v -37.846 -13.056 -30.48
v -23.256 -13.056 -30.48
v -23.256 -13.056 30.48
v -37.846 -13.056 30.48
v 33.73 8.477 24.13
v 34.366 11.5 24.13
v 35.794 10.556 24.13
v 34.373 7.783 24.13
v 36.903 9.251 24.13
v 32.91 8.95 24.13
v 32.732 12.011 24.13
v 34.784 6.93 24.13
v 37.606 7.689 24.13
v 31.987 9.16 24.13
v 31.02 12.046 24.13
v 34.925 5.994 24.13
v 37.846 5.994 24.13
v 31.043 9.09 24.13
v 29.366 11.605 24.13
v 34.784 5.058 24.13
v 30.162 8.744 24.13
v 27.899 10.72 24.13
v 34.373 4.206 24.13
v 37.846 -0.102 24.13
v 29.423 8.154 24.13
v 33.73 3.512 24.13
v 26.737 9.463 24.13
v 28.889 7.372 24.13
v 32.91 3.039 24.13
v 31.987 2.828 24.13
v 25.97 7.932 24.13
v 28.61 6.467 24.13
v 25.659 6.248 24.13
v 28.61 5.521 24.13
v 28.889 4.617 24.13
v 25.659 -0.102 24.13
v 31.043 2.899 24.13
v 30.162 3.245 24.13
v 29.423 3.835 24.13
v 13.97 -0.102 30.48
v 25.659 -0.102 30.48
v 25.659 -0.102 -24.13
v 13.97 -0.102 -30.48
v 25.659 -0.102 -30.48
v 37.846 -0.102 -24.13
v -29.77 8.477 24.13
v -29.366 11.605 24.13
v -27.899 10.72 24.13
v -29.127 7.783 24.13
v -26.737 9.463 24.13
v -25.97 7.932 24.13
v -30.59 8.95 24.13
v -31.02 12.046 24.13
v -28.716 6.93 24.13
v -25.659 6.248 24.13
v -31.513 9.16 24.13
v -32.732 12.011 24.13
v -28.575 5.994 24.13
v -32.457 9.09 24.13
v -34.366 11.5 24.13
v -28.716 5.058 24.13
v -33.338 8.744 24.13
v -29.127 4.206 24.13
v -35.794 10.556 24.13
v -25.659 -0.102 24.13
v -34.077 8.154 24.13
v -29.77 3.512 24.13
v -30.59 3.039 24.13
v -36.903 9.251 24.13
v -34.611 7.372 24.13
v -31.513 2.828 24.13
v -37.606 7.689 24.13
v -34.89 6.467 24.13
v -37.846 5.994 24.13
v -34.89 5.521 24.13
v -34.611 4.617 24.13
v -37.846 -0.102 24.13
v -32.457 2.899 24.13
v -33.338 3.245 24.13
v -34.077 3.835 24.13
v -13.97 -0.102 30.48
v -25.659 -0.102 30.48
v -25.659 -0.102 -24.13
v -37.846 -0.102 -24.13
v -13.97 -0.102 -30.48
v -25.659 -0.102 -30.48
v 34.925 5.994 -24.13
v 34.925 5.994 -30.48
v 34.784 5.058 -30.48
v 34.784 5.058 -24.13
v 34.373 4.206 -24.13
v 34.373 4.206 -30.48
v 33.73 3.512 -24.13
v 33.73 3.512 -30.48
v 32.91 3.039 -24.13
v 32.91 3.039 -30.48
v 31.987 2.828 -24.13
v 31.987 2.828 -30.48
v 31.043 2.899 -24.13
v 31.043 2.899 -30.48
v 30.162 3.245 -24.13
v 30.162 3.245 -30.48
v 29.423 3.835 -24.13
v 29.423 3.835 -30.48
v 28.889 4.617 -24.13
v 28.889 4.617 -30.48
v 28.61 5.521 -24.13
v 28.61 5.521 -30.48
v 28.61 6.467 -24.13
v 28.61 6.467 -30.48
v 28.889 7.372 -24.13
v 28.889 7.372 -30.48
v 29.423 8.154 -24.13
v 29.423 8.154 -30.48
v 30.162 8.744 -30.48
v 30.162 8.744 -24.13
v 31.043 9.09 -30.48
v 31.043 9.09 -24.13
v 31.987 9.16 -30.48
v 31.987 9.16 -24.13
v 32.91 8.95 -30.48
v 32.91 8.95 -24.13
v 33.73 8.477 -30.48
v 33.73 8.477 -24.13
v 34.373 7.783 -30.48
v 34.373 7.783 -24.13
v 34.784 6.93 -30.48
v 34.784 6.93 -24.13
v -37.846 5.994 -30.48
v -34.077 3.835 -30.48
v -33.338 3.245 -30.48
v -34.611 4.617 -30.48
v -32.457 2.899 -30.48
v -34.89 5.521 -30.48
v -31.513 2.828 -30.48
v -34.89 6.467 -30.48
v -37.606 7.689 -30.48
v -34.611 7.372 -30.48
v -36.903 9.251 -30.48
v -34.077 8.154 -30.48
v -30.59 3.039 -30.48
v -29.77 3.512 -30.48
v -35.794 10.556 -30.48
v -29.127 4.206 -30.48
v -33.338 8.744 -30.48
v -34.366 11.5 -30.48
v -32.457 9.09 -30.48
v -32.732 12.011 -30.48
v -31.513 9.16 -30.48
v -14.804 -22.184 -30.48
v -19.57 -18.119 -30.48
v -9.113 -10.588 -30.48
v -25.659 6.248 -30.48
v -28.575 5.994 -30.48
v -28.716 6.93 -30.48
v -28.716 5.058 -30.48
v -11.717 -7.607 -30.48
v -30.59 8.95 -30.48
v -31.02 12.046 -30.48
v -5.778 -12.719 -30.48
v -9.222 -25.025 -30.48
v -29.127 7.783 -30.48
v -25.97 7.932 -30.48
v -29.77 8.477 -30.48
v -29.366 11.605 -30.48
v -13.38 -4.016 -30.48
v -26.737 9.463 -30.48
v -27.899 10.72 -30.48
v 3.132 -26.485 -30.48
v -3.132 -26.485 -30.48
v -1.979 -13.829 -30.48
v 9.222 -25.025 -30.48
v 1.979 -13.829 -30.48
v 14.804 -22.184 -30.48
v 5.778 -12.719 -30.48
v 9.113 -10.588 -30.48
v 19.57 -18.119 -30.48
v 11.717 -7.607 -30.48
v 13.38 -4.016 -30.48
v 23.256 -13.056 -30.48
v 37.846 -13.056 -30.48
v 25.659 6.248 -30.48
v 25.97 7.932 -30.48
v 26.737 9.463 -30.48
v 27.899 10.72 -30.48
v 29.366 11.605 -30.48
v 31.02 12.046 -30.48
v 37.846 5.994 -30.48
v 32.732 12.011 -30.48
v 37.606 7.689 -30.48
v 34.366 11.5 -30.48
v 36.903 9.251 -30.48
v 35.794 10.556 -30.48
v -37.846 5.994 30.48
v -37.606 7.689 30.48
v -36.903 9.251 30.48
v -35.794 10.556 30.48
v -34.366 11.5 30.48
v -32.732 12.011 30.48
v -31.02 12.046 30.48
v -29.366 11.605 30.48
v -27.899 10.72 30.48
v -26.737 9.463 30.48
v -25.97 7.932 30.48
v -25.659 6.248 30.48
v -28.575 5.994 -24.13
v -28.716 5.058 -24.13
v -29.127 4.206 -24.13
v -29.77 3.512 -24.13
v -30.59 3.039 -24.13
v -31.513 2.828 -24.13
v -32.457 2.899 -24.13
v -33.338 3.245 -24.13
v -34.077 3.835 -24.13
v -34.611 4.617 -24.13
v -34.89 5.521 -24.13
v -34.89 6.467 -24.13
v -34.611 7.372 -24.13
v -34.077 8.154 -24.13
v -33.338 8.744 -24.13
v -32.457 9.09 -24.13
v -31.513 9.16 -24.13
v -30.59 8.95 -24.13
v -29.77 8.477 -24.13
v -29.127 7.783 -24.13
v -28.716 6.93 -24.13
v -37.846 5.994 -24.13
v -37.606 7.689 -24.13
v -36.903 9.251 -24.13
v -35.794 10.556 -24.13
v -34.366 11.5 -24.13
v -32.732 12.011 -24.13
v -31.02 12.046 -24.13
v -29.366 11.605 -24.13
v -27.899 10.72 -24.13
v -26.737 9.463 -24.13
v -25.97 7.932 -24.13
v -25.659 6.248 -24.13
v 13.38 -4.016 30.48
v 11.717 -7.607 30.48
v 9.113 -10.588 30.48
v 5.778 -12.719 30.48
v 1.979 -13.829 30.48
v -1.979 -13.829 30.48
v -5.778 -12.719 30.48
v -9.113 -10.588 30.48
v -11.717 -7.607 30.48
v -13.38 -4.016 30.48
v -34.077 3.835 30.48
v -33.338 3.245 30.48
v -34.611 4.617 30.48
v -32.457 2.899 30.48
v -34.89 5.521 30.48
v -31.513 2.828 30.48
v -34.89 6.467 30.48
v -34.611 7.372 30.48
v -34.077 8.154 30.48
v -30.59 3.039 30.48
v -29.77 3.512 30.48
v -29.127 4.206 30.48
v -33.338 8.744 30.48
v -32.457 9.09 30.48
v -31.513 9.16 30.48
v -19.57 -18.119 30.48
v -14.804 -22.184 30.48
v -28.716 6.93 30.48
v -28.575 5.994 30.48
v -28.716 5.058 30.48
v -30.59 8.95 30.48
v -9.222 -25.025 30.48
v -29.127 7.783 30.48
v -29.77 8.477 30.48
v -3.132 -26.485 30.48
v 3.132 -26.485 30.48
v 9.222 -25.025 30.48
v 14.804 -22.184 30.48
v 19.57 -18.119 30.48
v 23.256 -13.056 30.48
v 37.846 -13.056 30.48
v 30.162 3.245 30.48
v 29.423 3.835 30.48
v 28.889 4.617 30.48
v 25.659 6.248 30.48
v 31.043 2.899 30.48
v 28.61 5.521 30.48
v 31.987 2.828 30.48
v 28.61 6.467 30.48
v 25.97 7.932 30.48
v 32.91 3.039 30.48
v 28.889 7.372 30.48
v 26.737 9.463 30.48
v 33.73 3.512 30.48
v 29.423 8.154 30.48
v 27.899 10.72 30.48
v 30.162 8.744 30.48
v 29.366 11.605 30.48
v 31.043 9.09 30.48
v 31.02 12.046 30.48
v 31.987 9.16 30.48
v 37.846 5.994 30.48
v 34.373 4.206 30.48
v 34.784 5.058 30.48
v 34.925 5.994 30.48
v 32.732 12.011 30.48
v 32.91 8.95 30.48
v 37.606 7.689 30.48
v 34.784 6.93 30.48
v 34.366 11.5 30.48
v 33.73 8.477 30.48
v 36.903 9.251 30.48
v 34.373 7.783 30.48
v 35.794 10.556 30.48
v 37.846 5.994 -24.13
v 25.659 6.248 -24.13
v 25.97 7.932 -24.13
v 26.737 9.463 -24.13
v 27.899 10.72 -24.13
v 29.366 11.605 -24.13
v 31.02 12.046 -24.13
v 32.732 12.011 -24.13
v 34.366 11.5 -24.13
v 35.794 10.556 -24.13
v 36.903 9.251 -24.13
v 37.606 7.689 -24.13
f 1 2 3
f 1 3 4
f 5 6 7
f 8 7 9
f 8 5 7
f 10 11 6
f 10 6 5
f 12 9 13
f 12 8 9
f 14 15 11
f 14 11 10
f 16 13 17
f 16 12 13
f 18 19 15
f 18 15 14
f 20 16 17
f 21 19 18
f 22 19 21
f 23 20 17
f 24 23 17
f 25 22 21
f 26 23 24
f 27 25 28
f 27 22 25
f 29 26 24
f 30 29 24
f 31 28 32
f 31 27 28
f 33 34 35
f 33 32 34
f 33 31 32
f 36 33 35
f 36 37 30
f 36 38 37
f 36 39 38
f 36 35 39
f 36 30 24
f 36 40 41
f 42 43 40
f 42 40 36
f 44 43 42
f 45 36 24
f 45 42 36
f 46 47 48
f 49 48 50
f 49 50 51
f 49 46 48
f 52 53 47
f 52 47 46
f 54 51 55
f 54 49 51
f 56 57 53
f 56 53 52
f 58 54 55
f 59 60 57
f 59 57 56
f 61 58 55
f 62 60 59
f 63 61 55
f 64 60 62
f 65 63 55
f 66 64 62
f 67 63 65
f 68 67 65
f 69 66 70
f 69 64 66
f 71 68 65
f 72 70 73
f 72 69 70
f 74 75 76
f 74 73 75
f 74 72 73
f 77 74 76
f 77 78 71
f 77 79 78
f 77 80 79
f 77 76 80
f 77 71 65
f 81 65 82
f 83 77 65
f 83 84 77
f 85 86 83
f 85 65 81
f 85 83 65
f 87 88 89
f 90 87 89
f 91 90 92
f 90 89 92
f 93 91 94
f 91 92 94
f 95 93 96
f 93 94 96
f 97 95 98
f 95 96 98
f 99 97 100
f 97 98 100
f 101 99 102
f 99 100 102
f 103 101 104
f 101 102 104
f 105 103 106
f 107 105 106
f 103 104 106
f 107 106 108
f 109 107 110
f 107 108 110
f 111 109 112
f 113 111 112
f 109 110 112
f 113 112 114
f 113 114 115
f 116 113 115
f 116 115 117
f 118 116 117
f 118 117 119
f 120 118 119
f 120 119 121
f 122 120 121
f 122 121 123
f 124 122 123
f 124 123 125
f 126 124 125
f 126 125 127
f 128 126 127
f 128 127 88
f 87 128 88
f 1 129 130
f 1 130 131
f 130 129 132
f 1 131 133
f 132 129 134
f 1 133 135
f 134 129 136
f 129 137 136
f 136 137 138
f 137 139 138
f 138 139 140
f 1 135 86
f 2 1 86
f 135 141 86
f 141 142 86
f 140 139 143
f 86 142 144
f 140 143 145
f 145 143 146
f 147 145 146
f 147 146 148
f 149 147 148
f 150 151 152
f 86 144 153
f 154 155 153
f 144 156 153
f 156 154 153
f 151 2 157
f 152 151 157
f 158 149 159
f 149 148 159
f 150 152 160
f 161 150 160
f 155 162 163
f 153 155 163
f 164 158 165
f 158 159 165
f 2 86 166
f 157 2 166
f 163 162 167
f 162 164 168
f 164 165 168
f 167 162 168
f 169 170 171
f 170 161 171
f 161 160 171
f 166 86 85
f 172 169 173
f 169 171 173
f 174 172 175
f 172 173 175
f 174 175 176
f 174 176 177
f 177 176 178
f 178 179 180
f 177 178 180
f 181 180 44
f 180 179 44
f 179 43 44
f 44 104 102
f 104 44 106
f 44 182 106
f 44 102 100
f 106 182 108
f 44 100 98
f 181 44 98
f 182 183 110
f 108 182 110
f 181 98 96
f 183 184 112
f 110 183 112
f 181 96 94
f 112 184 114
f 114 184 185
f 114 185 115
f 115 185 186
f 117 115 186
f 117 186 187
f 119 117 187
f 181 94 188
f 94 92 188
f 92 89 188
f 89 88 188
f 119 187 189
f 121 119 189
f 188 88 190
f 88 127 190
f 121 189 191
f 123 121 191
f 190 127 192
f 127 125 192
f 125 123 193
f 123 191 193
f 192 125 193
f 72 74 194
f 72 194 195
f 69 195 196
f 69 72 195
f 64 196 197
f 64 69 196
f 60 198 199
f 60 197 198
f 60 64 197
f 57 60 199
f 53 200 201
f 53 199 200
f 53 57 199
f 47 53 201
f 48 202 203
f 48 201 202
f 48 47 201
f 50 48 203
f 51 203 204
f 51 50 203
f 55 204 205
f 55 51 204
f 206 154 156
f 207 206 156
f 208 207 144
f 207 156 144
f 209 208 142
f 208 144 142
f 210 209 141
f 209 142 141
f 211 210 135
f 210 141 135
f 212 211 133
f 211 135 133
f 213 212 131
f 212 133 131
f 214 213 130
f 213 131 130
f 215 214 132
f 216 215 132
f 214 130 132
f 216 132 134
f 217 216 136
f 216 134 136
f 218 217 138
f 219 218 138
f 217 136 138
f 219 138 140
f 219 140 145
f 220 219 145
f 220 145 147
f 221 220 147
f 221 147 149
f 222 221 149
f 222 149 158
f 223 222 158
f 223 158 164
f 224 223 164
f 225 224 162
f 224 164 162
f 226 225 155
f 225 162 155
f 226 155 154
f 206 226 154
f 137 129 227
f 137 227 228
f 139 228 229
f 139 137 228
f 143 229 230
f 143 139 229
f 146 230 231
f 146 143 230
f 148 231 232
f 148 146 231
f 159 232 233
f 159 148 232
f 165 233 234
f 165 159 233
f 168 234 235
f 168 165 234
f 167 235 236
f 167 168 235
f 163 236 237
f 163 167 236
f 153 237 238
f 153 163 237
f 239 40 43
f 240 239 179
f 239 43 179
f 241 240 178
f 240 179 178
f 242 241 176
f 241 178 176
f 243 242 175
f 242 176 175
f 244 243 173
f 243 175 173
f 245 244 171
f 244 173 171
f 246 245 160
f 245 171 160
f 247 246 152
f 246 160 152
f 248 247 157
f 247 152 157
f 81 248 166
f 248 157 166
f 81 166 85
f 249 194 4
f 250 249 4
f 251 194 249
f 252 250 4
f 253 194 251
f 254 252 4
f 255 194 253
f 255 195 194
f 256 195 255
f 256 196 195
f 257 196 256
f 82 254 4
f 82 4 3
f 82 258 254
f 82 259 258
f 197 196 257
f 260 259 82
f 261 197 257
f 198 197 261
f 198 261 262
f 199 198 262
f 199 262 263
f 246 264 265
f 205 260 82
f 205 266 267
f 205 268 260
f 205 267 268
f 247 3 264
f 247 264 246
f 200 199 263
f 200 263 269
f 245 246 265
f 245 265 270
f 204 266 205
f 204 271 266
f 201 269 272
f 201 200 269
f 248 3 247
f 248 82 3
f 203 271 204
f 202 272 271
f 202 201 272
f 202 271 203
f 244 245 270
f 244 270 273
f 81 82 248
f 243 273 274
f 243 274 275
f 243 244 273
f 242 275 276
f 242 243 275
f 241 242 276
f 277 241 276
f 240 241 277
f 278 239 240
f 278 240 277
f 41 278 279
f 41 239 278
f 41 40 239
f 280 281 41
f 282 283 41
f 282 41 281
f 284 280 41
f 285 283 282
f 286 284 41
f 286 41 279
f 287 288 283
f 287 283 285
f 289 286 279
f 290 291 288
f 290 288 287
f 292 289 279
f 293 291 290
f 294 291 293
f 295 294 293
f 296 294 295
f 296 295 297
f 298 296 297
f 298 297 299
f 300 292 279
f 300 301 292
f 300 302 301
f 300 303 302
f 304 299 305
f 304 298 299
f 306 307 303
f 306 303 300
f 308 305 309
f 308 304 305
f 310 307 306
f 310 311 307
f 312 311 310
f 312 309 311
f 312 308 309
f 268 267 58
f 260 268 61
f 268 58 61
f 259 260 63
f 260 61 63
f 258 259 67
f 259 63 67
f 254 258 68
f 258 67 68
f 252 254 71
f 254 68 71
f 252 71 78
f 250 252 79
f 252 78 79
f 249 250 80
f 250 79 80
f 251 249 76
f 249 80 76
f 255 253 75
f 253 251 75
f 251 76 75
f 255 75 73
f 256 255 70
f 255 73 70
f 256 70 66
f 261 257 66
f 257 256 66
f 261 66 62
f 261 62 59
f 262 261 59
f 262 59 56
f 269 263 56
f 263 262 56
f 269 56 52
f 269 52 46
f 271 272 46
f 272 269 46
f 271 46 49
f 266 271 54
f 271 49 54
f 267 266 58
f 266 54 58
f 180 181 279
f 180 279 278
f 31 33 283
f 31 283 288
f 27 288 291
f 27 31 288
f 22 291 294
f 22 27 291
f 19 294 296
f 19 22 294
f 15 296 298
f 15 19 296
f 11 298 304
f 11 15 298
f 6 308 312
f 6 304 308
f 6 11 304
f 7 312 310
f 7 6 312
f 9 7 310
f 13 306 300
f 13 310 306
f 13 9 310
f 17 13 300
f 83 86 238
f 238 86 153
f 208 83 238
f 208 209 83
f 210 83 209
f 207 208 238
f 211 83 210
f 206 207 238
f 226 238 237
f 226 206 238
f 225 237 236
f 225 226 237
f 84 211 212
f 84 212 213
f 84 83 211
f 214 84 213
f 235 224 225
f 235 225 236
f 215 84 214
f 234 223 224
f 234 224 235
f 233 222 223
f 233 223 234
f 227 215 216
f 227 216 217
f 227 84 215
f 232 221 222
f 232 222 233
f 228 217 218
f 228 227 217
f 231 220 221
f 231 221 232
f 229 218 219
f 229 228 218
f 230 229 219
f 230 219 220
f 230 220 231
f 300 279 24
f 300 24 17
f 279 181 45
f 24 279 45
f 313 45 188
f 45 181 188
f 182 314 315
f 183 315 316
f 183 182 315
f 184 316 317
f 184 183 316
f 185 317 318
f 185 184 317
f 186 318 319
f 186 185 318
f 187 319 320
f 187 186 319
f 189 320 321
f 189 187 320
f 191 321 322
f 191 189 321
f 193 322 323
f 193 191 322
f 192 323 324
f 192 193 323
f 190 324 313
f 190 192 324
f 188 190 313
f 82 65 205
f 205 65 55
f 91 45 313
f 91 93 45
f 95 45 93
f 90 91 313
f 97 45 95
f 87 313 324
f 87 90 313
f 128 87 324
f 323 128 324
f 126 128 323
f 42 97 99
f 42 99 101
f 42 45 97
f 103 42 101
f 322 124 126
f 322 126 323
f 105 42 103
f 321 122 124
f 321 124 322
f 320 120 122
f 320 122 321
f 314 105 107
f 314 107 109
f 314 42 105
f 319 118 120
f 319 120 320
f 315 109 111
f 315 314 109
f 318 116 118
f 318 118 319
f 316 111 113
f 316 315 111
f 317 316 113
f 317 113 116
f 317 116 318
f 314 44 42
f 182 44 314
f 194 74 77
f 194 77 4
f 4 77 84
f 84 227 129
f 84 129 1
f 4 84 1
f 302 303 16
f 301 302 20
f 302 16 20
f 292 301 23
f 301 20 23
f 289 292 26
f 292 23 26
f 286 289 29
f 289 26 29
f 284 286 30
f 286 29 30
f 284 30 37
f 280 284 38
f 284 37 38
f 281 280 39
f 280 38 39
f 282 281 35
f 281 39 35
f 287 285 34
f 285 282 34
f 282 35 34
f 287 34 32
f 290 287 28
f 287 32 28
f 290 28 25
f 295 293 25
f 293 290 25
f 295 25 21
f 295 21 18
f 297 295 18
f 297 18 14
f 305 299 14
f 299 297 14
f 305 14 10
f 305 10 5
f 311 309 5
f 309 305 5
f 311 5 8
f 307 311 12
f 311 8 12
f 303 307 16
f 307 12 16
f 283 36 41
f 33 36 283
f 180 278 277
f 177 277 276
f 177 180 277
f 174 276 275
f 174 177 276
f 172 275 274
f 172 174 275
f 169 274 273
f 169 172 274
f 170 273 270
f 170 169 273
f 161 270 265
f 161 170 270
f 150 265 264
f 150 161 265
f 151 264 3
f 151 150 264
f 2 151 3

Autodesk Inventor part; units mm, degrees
ref_plane "YZ Plane" through (0, 0, 0) normal (1, 0, 0) x (0, 1, 0)
ref_plane "XZ Plane" through (0, 0, 0) normal (0, 1, 0) x (-1, 0, 0)
ref_plane "XY Plane" through (0, 0, 0) normal (0, 0, 1) x (1, 0, 0)
sketch "Sketch1" plane through (0, 0, 0) normal (0, 0, 1) x (1, 0, 0)
  arc A0 (-13.9696, -0.1018) -> (13.9696, -0.1018) centre (0, 0) ccw
  line L0 (0, 64.951) -> (0, -100.8994)
  arc A1 (-23.2558, -13.0558) -> (23.2558, -13.0558) centre (0, 0) ccw
  line L1 (-23.2558, -13.0558) -> (-37.846, -13.0558)
  line L2 (37.846, -13.0558) -> (23.2558, -13.0558)
  arc A2 (-25.6593, 6.2482) -> (-37.846, 5.9942) centre (-31.75, 5.9942) ccw
  line L3 (-37.846, -0.3558) -> (-37.846, 5.9942)
  line L4 (-25.6593, -0.1018) -> (-25.6593, 6.2482)
  arc A3 (37.846, 5.9942) -> (25.6593, 6.2482) centre (31.75, 5.9942) ccw
  line L5 (37.846, -0.3558) -> (37.846, 5.9942)
  line L6 (25.6593, -0.1018) -> (25.6593, 6.2482)
  line L7 (-25.6593, -0.1018) -> (-13.9696, -0.1018)
  line L8 (13.9696, -0.1018) -> (25.6593, -0.1018)
  circle A4 centre (-31.75, 5.9942) radius 3.175
  circle A5 centre (31.75, 5.9942) radius 3.175
  line L9 (-37.846, -0.3558) -> (-37.846, -13.0558)
  line L10 (37.846, -0.3558) -> (37.846, -13.0558)
  dimension "d0" = 27.94
  dimension "d4" = 12.7
  dimension "d5" = 12.192
  dimension "d6" = 63.5
  dimension "d7" = 6.35
  dimension "d8" = 6.35
  dimension "d13" = 12.7
  dimension "d14" = 6.35
  dimension "d29" = 14.5902
  dimension "d31" = 14.5902
  dimension "d32" = 6.35
extrude "Extrusion1" add sketch "Sketch1" along normal mid plane 60.96
sketch "Sketch3" plane through (-25.6593, -0.1018, 30.48) normal (1, 0, 0) x (0, 0, -1)
  line L0 (60.96, 0) -> (0, 0) projected
  line L1 (60.96, 12.192) -> (0, 12.192) projected
  line L2 (6.35, 0) -> (54.61, 0)
  line L3 (54.61, 0) -> (54.61, 12.192)
  line L4 (54.61, 12.192) -> (6.35, 12.192)
  line L5 (6.35, 12.192) -> (6.35, 0)
  line L6 (0, 12.192) -> (0, 6.096) projected
  line L7 (60.96, 6.35) -> (60.96, 12.192) projected
  point P0 (30.48, 0.1018)
  point P1 (6.35, 12.192)
  dimension "d23" = 6.35
  dimension "d24" = 6.35
extrude "Extrusion3" cut sketch "Sketch3" along normal mid plane 152.4
properties part number "Relaxation chamber outer holder"
